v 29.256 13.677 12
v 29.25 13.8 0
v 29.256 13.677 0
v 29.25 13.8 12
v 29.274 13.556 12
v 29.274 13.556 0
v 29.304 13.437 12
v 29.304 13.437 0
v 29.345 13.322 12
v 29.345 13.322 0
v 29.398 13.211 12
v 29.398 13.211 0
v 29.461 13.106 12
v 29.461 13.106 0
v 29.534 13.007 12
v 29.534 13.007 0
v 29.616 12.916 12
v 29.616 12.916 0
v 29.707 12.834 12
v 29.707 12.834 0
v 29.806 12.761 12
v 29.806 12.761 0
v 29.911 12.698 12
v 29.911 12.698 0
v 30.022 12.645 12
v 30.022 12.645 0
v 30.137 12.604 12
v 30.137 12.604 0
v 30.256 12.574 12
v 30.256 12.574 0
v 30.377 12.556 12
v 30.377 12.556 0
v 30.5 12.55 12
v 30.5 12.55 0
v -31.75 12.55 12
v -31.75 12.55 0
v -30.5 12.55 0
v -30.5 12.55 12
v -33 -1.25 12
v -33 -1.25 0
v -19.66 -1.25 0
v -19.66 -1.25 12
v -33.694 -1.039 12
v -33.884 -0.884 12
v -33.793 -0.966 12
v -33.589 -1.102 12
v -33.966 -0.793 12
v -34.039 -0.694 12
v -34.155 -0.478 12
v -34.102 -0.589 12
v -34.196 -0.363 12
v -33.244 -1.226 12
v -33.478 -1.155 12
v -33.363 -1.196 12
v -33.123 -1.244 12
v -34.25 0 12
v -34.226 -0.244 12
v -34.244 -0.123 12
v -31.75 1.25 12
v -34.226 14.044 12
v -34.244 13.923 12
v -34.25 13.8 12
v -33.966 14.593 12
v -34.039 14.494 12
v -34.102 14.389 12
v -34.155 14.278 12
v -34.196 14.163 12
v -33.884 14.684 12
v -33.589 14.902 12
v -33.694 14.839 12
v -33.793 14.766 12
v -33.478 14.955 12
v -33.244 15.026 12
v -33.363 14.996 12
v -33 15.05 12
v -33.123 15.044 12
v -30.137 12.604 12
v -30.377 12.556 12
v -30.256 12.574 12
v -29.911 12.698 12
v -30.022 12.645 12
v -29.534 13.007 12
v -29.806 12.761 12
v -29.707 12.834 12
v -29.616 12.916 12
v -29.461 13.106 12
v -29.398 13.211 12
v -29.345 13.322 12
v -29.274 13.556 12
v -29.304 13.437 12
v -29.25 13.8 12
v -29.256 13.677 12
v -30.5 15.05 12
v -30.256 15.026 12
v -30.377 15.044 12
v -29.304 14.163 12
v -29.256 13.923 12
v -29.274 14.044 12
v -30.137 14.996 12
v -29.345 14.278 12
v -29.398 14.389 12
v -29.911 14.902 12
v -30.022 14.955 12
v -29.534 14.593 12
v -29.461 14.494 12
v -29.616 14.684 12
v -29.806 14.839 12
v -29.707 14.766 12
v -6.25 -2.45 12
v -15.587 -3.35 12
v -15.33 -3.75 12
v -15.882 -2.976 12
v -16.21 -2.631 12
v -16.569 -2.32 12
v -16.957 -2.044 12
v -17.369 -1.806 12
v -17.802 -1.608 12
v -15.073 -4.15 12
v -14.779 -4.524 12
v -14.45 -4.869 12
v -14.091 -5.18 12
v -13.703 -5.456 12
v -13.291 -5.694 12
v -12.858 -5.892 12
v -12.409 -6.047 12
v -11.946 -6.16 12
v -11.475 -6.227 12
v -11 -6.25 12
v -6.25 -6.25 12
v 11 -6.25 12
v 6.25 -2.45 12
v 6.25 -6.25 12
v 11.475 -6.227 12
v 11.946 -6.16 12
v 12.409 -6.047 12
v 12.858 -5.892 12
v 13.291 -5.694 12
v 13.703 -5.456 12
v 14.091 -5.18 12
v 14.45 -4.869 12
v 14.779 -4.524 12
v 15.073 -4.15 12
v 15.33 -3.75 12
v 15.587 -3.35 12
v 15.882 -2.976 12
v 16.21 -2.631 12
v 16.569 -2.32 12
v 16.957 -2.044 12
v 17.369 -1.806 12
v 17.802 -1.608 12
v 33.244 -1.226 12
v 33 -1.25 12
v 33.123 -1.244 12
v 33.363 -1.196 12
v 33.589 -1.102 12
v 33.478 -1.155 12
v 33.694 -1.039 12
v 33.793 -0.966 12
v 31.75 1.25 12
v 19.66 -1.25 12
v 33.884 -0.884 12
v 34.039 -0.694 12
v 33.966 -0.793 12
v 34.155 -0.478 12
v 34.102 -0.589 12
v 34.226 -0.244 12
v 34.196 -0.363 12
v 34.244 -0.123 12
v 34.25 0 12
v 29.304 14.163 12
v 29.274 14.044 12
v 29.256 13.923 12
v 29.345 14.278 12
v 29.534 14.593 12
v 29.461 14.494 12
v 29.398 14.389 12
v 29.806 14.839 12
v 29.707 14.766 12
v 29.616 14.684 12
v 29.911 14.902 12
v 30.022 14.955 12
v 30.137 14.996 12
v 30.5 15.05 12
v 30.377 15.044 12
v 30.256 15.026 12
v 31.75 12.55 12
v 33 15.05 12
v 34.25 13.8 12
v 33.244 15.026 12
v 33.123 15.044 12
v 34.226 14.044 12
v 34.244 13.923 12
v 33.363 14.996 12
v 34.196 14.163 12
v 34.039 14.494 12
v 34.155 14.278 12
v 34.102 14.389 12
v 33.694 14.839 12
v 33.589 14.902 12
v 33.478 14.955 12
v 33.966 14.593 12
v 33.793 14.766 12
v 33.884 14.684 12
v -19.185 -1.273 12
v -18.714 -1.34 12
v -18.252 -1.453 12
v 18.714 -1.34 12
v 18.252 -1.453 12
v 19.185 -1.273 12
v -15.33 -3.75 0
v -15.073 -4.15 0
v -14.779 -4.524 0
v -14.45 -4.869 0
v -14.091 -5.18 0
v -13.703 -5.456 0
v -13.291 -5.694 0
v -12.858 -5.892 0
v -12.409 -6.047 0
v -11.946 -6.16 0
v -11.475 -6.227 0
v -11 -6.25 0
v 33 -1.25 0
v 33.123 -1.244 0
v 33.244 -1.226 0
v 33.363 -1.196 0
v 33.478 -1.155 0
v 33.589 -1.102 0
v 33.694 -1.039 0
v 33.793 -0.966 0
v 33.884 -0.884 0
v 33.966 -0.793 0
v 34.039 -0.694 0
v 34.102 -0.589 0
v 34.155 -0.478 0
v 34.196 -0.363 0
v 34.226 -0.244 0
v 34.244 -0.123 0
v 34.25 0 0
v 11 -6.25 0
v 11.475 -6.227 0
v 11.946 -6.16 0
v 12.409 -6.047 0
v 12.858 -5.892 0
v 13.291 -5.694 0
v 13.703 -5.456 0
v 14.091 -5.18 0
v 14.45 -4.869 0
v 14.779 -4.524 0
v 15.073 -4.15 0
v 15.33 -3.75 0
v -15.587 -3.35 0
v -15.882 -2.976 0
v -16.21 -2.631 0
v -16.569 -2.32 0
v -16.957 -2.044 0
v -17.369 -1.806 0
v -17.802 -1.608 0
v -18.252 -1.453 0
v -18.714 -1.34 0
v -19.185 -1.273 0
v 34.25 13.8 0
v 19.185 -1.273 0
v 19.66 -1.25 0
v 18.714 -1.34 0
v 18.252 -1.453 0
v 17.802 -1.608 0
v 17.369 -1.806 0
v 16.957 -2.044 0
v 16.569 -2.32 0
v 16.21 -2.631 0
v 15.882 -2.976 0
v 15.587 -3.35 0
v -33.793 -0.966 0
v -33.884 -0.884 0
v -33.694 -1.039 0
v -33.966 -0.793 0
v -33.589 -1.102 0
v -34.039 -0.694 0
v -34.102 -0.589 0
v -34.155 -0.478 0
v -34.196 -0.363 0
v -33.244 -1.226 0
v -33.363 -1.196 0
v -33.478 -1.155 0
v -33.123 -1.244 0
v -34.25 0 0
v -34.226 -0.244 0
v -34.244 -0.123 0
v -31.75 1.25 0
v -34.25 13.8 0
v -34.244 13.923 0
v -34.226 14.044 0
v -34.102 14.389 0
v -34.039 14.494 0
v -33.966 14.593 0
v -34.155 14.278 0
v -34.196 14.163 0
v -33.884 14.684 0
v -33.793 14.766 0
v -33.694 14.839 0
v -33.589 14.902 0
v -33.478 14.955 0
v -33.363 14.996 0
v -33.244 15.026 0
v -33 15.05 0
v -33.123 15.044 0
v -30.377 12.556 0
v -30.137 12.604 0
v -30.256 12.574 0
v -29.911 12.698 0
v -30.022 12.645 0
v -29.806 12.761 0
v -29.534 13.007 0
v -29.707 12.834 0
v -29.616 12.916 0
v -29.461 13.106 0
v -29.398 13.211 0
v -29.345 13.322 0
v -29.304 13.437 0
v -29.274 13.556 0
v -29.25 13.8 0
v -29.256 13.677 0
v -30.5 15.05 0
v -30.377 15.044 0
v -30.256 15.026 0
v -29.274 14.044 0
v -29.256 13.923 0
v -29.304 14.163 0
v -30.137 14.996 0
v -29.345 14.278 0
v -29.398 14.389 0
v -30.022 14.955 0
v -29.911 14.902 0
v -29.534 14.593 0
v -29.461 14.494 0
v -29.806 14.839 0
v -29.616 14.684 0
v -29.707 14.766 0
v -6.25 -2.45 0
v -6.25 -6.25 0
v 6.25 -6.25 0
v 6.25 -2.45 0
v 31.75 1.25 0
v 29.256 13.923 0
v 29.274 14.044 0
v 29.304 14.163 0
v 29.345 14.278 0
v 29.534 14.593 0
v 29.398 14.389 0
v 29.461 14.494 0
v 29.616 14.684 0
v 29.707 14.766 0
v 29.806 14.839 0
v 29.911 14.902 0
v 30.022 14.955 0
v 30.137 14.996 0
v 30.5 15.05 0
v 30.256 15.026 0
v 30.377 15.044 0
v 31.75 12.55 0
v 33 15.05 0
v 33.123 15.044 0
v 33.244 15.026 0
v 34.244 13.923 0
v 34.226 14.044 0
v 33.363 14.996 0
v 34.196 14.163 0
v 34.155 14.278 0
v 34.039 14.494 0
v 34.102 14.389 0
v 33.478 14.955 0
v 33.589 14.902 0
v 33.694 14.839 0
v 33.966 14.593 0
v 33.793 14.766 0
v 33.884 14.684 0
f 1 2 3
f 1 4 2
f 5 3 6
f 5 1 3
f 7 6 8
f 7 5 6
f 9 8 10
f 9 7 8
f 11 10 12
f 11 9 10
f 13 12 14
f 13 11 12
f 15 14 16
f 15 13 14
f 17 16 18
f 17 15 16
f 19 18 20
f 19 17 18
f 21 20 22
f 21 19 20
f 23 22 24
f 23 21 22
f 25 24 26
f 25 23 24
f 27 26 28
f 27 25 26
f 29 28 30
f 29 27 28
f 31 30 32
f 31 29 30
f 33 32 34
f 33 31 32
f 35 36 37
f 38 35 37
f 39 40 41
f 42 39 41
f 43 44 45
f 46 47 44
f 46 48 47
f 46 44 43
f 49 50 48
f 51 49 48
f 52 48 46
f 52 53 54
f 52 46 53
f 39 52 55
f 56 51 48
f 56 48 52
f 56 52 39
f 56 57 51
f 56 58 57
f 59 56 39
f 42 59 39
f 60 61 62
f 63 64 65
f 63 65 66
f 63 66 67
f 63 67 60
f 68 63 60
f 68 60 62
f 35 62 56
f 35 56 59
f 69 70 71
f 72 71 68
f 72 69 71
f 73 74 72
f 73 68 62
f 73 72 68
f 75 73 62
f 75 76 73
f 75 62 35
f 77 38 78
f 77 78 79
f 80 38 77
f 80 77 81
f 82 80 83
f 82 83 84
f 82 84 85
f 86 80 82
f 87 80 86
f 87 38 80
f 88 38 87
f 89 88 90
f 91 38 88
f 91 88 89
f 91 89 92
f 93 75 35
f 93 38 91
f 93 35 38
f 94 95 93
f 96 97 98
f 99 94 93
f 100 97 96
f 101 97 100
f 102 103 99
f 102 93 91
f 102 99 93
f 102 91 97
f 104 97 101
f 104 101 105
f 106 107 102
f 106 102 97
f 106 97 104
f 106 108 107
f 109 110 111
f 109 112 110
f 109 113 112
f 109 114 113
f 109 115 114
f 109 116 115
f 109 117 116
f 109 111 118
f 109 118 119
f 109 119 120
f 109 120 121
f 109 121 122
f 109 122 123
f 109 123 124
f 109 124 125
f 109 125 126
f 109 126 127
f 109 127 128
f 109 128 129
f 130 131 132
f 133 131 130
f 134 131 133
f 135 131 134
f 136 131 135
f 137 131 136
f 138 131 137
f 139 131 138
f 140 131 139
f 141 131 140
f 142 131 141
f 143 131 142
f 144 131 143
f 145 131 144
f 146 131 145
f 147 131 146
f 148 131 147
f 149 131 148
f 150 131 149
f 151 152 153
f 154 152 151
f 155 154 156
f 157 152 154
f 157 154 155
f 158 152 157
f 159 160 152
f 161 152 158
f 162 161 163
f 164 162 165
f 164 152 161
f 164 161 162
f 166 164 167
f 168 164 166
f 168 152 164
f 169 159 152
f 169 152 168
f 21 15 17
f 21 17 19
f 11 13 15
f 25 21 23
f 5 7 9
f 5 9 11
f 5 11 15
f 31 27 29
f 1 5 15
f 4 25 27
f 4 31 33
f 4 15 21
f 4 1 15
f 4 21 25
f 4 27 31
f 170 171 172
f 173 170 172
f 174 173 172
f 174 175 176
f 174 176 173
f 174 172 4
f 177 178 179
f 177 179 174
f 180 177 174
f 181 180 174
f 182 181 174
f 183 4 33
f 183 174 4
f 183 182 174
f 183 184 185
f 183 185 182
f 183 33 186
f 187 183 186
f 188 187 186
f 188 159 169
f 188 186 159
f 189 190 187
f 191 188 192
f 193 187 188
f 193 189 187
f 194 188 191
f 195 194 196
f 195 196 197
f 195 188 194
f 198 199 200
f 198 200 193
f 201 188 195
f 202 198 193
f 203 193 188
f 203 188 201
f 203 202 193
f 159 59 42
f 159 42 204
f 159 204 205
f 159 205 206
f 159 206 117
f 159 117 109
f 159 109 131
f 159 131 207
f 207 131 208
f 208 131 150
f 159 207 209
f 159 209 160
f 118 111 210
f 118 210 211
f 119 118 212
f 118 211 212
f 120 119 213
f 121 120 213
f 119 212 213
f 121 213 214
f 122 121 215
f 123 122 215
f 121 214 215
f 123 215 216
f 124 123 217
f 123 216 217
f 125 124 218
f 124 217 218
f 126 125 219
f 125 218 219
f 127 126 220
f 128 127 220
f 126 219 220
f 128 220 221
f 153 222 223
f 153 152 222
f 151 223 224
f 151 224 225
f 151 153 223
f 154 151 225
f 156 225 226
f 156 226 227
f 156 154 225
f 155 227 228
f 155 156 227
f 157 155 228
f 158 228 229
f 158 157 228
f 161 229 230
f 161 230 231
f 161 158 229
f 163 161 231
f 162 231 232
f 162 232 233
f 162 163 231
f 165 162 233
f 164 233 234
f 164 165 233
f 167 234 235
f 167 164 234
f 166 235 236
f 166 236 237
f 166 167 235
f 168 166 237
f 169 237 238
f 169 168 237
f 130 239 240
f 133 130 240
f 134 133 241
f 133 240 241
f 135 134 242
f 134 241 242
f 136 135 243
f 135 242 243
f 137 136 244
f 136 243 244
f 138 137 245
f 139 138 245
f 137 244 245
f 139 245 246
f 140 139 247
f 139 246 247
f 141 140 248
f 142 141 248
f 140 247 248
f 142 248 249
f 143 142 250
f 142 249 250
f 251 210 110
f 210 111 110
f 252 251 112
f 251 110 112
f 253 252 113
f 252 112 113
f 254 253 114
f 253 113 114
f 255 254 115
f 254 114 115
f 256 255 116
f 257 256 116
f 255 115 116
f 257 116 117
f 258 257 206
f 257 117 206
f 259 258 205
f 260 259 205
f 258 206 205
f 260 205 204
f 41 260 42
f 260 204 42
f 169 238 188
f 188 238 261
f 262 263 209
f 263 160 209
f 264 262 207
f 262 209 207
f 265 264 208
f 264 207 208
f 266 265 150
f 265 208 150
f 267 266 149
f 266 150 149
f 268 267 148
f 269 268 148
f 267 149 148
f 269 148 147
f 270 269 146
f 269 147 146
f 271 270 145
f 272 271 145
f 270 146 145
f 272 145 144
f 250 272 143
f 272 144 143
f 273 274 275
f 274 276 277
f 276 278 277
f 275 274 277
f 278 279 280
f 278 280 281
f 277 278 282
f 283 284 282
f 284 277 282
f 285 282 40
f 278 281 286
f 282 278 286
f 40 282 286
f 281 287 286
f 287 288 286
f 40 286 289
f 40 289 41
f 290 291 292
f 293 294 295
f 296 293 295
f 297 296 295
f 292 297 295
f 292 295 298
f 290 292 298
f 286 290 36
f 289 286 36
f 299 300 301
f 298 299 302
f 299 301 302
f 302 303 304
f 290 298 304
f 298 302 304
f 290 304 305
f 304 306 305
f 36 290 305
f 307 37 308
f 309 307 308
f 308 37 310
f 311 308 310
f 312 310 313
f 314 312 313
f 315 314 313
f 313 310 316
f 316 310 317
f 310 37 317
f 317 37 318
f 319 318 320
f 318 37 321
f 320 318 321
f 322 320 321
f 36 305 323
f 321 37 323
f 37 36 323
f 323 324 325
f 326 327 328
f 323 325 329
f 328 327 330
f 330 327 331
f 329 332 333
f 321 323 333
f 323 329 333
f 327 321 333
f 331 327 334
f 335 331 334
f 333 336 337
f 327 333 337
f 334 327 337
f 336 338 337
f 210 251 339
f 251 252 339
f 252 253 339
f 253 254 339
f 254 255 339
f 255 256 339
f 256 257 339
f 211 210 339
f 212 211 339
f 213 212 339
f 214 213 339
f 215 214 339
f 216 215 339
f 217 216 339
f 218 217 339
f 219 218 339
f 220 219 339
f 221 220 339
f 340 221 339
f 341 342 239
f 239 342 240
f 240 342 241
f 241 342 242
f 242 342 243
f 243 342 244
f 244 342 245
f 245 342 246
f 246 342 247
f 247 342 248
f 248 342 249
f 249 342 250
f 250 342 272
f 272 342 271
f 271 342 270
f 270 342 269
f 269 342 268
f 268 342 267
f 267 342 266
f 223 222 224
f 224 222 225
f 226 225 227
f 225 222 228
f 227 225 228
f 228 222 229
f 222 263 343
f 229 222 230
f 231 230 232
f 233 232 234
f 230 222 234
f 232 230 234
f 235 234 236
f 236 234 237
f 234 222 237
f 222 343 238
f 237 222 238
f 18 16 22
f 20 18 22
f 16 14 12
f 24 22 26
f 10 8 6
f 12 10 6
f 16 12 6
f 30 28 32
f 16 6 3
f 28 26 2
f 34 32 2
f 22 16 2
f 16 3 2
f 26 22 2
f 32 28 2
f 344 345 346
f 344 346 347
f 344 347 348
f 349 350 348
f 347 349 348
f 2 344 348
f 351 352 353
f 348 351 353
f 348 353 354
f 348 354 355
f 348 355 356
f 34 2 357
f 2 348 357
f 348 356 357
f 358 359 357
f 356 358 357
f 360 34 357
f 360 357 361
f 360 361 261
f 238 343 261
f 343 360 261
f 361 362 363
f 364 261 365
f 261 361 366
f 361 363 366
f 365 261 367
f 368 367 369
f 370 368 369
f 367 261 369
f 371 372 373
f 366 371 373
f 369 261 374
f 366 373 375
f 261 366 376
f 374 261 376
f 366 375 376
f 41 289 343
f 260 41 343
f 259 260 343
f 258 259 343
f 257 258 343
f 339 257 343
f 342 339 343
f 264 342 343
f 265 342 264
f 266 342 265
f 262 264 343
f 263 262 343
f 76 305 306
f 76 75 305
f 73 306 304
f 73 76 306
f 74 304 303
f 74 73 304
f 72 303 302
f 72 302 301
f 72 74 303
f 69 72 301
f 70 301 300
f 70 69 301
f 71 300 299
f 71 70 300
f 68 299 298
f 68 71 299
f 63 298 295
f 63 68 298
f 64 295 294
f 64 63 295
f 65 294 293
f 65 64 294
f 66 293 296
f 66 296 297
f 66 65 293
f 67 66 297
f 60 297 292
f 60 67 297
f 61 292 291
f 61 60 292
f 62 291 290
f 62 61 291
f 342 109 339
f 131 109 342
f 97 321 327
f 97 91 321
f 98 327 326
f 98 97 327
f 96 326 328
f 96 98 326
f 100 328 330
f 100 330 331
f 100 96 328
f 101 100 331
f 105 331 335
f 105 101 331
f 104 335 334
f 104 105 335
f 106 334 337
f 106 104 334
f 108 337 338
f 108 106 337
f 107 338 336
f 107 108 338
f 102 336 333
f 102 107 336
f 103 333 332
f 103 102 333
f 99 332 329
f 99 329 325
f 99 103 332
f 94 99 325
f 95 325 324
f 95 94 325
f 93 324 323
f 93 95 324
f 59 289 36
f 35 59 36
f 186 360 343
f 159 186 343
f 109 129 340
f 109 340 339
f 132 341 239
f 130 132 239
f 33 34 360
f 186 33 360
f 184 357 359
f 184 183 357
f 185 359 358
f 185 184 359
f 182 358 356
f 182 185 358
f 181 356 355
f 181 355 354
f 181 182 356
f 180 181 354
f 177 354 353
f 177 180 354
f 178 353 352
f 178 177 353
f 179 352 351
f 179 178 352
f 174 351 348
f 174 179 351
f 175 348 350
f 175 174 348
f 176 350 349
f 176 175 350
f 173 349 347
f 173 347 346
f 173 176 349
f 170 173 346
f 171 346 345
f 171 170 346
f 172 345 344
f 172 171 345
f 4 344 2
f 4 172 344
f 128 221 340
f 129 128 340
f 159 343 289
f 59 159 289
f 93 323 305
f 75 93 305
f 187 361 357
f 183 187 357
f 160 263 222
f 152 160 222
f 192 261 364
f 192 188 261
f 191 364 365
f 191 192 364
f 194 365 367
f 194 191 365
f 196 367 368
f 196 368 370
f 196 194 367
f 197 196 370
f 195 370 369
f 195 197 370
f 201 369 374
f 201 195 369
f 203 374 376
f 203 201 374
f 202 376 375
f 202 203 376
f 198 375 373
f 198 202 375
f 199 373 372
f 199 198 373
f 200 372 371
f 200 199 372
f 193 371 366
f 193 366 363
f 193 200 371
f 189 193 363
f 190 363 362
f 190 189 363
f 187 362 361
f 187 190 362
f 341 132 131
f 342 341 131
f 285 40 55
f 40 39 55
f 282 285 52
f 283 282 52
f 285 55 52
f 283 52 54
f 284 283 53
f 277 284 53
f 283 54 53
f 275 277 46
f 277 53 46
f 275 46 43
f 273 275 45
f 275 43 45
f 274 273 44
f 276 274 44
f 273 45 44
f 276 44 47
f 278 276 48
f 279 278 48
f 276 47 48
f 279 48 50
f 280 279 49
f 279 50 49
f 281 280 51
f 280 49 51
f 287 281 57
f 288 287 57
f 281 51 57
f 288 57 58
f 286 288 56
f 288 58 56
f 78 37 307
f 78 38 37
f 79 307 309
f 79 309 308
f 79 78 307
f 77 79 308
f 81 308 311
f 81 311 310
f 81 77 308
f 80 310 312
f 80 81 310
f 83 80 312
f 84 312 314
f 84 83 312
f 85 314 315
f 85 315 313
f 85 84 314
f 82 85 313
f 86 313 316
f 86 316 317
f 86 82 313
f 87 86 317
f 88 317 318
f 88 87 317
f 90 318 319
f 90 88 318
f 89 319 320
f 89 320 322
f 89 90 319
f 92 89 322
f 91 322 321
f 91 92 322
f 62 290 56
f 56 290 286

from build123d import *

# Parameters (mm, degrees)
F0_W     = 22
F0_H     = 5
F1_DEPTH = 12
F2_W     = 12.5
F2_H     = 3.8
F3_DEPTH = 12
F4_R     = 5
F5_R     = 1.24999


# Not quite as in the source:
# - a fillet or chamfer is up to 0.001 mm smaller than in the source, because OpenCascade refuses the exact size


with BuildPart() as f1:
    # F0 (on Top) → F1 (new body)
    with BuildSketch(Plane.XY):
        Polygon((31.75, -1.25), (31.75, 1.25), (-31.75, 1.25), (-31.75, -1.25), (-16, -1.25), (-11, -1.25), (11, -1.25), (16, -1.25), align=None)
        Polygon((31.75, 12.55), (31.75, 1.25), (31.75, -1.25), (34.25, -1.25), (34.25, 12.55), align=None)
        Polygon((-31.75, -1.25), (-31.75, 1.25), (-31.75, 12.55), (-34.25, 12.55), (-34.25, -1.25), align=None)
        Polygon((29.25, 12.55), (31.75, 12.55), (34.25, 12.55), (34.25, 15.05), (29.25, 15.05), align=None)
        Polygon((-34.25, 12.55), (-31.75, 12.55), (-29.25, 12.55), (-29.25, 15.05), (-34.25, 15.05), align=None)
        with BuildLine():
            ThreePointArc((11, -6.25), (14.5355339059, -4.7855339059), (16, -1.25))
            Line((16, -1.25), (11, -1.25))
            Line((11, -1.25), (11, -6.25))
        make_face()
        with BuildLine():
            Line((-11, -1.25), (-16, -1.25))
            ThreePointArc((-16, -1.25), (-14.5355339059, -4.7855339059), (-11, -6.25))
            Line((-11, -6.25), (-11, -1.25))
        make_face()
        with Locations((0, -3.75)):
            Rectangle(F0_W, F0_H)
    extrude(amount=F1_DEPTH)

    # F2 (on face) → F3 (cut, through all)
    with BuildSketch(Plane.XY.offset(12)):
        with Locations((0, -4.35)):
            Rectangle(F2_W, F2_H)
    extrude(amount=-F3_DEPTH, mode=Mode.SUBTRACT)

    # F4
    f4_edges = [f1.edges().sort_by_distance(p)[0] for p in [
        (16, -1.25, 6),
        (-16, -1.25, 6),
    ]]
    fillet(f4_edges, radius=F4_R)

    # F5 (radius 1.25 in the source; OpenCascade refuses exactly that, so slightly less here)
    f5_edges = [f1.edges().sort_by_distance(p)[0] for p in [
        (-34.25, -1.25, 6),
        (34.25, -1.25, 6),
        (-34.25, 15.05, 6),
        (-29.25, 15.05, 6),
        (-29.25, 12.55, 6),
        (29.25, 12.55, 6),
        (29.25, 15.05, 6),
        (34.25, 15.05, 6),
    ]]
    fillet(f5_edges, radius=F5_R)


solid = f1.part
